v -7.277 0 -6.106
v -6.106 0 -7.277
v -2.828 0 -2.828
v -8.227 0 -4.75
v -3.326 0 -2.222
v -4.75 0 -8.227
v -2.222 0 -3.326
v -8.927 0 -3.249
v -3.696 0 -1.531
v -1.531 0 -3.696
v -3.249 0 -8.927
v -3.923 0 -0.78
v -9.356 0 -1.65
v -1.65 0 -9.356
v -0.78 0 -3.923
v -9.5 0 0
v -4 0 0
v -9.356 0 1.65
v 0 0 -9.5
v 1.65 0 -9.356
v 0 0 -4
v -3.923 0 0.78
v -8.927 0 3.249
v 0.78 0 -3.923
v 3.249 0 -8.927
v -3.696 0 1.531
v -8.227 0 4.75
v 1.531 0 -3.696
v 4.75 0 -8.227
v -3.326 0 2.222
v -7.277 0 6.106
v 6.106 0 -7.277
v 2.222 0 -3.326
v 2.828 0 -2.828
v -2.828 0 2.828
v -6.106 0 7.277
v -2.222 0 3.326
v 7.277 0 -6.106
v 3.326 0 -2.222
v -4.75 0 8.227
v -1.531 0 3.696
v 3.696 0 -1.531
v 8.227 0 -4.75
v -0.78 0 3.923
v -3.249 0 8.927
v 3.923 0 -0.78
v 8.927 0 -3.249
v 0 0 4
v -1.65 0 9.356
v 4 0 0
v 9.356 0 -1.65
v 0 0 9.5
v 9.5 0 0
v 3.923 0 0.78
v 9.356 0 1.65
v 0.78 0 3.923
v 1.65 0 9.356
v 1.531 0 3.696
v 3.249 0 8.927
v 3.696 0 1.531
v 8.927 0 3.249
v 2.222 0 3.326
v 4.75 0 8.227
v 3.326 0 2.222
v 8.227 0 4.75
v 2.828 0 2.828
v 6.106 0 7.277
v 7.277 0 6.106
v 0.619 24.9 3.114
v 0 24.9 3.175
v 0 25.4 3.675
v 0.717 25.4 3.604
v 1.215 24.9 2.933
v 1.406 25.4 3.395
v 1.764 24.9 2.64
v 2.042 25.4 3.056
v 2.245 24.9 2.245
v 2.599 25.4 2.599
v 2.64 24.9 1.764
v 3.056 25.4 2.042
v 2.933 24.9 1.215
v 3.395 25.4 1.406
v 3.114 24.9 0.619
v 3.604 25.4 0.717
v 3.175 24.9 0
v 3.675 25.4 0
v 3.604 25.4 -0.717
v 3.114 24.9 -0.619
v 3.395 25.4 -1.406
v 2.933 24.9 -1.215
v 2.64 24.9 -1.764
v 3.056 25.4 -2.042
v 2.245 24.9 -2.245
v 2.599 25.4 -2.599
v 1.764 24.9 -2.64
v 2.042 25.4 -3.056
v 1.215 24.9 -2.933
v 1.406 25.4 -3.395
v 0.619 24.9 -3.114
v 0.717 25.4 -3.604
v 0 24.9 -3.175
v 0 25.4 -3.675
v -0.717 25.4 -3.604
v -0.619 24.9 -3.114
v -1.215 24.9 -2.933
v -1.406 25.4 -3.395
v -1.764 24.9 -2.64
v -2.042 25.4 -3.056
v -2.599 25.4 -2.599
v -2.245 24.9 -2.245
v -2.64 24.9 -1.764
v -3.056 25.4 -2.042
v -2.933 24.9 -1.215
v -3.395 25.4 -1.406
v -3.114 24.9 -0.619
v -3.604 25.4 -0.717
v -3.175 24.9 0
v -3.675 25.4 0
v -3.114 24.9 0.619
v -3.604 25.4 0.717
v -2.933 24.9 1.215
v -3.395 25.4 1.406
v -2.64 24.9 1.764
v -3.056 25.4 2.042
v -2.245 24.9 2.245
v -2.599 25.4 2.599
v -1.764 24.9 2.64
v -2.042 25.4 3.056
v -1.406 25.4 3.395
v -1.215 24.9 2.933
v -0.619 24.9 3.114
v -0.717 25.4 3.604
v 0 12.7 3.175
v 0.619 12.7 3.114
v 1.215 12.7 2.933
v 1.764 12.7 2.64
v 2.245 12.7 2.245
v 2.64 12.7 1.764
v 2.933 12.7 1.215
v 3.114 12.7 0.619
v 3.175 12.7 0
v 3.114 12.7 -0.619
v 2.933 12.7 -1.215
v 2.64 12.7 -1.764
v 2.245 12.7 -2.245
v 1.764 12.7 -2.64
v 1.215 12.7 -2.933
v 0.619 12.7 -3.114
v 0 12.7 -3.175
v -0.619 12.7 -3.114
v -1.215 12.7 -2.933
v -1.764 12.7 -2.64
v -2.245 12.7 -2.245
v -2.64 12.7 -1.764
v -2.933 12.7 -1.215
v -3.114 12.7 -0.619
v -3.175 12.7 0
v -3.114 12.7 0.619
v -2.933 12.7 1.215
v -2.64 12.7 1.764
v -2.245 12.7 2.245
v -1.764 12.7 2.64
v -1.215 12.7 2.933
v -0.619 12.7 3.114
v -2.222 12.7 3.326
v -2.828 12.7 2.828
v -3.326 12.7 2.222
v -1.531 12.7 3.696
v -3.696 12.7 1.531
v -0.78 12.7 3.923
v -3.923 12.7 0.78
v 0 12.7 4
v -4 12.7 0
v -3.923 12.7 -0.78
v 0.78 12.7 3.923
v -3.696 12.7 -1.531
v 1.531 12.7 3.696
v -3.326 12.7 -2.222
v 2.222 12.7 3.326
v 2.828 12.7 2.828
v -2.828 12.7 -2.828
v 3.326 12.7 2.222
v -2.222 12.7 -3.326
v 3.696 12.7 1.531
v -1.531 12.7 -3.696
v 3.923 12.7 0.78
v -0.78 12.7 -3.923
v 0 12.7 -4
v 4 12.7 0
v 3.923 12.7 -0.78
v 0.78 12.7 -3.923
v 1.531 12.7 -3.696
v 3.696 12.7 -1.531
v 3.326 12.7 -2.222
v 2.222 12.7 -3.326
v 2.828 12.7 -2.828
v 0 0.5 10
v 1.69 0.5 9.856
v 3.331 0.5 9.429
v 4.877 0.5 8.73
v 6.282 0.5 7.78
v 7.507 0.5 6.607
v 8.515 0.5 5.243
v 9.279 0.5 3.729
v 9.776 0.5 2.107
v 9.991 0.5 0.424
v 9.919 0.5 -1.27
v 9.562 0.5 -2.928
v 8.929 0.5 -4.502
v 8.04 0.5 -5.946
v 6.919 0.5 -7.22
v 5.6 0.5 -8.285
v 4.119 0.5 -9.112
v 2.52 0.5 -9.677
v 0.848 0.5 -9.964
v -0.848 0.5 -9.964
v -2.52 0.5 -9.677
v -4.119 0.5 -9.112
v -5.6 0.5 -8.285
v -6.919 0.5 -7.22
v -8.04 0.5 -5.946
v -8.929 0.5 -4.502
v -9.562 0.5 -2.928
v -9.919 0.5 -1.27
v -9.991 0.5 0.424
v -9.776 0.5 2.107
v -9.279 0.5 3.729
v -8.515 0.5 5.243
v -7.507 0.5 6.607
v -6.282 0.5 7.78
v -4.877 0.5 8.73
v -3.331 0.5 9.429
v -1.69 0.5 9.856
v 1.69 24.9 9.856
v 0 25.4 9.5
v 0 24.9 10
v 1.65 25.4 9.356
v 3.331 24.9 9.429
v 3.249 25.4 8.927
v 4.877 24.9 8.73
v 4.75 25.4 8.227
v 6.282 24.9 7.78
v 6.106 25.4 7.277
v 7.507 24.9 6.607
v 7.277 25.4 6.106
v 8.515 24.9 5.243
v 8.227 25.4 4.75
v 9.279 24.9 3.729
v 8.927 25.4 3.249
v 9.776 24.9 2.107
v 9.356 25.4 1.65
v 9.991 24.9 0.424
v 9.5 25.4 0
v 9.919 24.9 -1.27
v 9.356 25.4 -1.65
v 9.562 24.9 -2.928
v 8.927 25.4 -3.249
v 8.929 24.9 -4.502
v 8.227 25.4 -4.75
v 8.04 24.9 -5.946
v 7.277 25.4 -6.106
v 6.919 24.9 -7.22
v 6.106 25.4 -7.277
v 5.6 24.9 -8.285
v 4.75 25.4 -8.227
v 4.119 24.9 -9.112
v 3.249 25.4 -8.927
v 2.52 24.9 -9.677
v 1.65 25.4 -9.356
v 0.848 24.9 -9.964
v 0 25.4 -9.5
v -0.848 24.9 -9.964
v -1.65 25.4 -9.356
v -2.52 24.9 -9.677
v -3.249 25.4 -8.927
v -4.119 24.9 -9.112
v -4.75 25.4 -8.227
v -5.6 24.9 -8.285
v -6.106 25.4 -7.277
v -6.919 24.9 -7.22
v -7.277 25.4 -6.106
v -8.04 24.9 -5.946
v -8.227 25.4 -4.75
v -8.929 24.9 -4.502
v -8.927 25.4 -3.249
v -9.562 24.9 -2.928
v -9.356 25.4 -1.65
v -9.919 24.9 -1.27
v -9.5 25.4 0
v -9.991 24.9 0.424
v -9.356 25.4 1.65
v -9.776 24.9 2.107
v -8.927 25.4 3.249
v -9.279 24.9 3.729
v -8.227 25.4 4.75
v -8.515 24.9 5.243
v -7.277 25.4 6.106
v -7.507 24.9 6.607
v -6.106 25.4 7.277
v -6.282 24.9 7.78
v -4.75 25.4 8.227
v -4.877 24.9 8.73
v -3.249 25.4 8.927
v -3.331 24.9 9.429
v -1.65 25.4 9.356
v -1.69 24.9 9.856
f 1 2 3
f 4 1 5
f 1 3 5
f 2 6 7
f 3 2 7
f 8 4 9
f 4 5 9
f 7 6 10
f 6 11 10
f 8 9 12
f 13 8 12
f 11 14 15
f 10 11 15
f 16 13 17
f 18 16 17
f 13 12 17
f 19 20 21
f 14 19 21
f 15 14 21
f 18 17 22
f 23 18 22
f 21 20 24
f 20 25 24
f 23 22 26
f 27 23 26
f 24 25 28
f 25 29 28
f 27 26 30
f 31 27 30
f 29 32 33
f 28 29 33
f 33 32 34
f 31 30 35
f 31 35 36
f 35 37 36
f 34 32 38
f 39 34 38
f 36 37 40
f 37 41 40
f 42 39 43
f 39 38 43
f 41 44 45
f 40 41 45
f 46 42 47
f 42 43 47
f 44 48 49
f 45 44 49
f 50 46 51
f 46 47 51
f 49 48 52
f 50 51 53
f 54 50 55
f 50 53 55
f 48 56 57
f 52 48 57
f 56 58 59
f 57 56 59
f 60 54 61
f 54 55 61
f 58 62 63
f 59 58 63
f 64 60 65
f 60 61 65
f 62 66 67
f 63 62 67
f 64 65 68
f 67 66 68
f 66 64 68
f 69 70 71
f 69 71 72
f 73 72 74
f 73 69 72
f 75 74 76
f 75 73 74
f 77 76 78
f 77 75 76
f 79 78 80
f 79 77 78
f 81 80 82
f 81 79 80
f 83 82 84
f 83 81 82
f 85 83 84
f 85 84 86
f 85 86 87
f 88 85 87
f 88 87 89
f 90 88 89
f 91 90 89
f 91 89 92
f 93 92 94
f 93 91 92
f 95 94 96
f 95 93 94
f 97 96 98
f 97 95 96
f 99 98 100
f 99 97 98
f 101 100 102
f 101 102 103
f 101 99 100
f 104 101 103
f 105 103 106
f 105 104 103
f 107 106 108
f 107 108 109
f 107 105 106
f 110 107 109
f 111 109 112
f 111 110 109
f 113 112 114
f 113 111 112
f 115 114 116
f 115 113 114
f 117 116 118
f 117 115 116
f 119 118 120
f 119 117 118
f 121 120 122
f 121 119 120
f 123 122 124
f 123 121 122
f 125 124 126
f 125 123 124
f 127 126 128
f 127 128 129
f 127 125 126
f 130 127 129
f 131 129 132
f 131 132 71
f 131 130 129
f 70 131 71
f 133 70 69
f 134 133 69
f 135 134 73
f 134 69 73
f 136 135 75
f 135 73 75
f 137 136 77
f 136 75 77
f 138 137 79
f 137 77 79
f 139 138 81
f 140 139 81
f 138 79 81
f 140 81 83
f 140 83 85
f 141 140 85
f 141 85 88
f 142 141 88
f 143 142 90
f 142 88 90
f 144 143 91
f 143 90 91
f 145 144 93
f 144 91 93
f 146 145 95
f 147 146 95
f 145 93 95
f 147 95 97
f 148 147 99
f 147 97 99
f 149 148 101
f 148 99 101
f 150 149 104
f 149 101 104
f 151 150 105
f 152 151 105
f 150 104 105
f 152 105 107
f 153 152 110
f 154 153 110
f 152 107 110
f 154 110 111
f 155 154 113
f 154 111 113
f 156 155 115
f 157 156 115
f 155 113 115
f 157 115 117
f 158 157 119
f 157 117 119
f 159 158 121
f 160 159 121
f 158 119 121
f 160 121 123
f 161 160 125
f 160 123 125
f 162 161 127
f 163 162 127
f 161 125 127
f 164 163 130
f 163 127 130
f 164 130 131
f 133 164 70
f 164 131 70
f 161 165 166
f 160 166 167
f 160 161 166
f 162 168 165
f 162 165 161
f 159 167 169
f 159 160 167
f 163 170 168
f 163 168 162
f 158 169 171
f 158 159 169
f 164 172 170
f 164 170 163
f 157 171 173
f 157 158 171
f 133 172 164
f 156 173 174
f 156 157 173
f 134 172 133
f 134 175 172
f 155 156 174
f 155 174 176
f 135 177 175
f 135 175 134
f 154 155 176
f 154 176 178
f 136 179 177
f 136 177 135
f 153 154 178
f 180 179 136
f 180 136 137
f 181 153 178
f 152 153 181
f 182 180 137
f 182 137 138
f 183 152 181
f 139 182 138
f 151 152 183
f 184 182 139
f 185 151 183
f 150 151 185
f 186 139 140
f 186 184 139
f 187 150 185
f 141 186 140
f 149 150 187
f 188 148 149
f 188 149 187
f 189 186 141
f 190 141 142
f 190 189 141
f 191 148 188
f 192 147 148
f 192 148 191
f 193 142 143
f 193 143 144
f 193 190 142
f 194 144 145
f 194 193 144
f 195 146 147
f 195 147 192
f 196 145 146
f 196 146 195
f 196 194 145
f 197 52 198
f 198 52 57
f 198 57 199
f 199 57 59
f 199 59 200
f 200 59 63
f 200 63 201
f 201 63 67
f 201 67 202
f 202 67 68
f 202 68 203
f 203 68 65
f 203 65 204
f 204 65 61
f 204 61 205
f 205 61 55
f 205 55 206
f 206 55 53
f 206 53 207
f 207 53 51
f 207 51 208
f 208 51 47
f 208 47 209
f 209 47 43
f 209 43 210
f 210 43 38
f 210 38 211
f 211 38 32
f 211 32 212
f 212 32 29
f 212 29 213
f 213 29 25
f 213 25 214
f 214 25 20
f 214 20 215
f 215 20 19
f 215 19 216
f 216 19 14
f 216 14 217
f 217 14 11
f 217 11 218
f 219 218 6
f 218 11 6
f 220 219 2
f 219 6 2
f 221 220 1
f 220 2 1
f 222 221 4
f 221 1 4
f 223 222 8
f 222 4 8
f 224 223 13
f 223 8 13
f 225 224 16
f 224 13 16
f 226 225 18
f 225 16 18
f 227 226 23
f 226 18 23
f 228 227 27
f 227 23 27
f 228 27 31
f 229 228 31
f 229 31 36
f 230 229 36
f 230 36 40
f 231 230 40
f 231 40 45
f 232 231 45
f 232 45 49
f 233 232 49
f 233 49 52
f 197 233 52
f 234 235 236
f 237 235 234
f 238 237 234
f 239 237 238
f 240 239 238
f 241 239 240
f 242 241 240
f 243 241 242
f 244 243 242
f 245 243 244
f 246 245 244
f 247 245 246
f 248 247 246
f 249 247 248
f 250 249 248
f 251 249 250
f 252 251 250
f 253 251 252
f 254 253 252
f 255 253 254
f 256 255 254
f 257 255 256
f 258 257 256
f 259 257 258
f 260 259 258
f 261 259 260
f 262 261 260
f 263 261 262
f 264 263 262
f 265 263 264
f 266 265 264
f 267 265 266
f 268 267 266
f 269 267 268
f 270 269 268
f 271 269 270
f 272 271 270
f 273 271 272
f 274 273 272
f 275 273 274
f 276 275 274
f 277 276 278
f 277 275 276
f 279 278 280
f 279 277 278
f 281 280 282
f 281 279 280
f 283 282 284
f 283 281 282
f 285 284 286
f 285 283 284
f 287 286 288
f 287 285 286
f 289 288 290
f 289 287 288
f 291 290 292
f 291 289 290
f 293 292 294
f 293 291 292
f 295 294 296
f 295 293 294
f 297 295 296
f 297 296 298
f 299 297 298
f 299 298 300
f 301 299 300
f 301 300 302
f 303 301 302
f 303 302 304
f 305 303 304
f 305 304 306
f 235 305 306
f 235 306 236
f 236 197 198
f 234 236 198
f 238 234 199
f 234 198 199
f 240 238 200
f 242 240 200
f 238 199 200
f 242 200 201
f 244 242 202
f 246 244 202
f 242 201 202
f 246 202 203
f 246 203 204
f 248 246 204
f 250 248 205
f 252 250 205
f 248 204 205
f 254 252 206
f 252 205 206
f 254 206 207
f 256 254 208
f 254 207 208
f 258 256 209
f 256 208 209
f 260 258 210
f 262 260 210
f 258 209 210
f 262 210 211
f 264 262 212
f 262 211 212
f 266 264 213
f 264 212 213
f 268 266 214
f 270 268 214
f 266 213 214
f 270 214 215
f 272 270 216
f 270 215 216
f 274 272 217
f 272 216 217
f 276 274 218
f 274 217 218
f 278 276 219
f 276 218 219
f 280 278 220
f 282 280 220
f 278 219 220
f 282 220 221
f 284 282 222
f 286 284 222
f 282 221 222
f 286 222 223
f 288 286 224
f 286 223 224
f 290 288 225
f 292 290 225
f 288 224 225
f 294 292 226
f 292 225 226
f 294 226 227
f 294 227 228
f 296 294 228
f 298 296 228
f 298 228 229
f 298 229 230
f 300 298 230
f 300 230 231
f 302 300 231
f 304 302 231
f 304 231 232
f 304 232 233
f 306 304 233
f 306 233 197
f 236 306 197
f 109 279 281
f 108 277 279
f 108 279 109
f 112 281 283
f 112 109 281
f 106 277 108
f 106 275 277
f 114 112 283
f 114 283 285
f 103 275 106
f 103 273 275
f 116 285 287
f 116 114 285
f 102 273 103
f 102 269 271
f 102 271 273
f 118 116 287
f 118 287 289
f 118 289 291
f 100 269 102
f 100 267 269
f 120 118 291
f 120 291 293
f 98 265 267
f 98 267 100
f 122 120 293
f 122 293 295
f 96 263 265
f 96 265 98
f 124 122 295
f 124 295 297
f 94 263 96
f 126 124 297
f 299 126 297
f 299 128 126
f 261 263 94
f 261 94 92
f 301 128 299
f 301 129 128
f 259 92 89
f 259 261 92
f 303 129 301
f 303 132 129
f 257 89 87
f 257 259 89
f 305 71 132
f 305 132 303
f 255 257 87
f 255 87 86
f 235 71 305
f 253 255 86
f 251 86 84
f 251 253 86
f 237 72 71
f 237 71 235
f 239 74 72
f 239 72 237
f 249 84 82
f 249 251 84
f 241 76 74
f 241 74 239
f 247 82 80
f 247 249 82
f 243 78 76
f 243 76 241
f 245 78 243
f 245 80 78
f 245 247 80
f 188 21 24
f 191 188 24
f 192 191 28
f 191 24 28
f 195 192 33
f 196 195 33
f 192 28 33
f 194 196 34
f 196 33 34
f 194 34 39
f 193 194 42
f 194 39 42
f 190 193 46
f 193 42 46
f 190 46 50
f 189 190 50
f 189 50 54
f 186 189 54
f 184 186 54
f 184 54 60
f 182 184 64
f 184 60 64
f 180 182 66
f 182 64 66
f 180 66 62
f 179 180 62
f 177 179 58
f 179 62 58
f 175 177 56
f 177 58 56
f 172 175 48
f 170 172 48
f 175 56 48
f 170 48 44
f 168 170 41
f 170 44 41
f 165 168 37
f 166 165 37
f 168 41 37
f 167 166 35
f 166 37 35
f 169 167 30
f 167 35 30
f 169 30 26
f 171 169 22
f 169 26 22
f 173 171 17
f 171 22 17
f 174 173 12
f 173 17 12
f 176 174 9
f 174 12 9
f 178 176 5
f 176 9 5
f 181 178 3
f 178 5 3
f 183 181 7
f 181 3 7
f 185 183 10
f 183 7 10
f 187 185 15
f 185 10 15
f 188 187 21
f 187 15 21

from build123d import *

# Parameters (mm, degrees)
SKETCH2_R           = 10
BOSS_EXTRUDE1_DEPTH = 25.4
SKETCH3_R           = 3.175
CUT_EXTRUDE1_DEPTH  = 12.7
CHAMFER1_SIZE       = 0.5
SKETCH4_R           = 4
CUT_EXTRUDE2_DEPTH  = 12.7


with BuildPart() as part:
    # Sketch2 → Boss-Extrude1 (new body)
    with BuildSketch(Plane(origin=(0, 0, 0), x_dir=(1, 0, 0), z_dir=(0, 1, 0))):
        with Locations(Location((0, 0, 0), (0, 0, 270))):
            Circle(SKETCH2_R)
    extrude(amount=BOSS_EXTRUDE1_DEPTH)

    # Sketch3 → Cut-Extrude1 (cut)
    with BuildSketch(Plane(origin=(0, 25.4, 0), x_dir=(1, 0, 0), z_dir=(0, 1, 0))):
        with Locations(Location((0, 0, 0), (0, 0, 270))):
            Circle(SKETCH3_R)
    extrude(amount=-CUT_EXTRUDE1_DEPTH, mode=Mode.SUBTRACT)

    # Chamfer1
    chamfer1_edges = [part.edges().sort_by_distance(p)[0] for p in [
        (0, 0, -10),
        (0, 25.4, -10),
        (0, 25.4, -3.175),
    ]]
    chamfer(chamfer1_edges, length=CHAMFER1_SIZE)

    # Sketch4 → Cut-Extrude2 (cut)
    with BuildSketch(Plane.XZ):
        with Locations(Location((0, 0, 0), (0, 0, 270))):
            Circle(SKETCH4_R)
    extrude(amount=-CUT_EXTRUDE2_DEPTH, mode=Mode.SUBTRACT)


solid = part.part
